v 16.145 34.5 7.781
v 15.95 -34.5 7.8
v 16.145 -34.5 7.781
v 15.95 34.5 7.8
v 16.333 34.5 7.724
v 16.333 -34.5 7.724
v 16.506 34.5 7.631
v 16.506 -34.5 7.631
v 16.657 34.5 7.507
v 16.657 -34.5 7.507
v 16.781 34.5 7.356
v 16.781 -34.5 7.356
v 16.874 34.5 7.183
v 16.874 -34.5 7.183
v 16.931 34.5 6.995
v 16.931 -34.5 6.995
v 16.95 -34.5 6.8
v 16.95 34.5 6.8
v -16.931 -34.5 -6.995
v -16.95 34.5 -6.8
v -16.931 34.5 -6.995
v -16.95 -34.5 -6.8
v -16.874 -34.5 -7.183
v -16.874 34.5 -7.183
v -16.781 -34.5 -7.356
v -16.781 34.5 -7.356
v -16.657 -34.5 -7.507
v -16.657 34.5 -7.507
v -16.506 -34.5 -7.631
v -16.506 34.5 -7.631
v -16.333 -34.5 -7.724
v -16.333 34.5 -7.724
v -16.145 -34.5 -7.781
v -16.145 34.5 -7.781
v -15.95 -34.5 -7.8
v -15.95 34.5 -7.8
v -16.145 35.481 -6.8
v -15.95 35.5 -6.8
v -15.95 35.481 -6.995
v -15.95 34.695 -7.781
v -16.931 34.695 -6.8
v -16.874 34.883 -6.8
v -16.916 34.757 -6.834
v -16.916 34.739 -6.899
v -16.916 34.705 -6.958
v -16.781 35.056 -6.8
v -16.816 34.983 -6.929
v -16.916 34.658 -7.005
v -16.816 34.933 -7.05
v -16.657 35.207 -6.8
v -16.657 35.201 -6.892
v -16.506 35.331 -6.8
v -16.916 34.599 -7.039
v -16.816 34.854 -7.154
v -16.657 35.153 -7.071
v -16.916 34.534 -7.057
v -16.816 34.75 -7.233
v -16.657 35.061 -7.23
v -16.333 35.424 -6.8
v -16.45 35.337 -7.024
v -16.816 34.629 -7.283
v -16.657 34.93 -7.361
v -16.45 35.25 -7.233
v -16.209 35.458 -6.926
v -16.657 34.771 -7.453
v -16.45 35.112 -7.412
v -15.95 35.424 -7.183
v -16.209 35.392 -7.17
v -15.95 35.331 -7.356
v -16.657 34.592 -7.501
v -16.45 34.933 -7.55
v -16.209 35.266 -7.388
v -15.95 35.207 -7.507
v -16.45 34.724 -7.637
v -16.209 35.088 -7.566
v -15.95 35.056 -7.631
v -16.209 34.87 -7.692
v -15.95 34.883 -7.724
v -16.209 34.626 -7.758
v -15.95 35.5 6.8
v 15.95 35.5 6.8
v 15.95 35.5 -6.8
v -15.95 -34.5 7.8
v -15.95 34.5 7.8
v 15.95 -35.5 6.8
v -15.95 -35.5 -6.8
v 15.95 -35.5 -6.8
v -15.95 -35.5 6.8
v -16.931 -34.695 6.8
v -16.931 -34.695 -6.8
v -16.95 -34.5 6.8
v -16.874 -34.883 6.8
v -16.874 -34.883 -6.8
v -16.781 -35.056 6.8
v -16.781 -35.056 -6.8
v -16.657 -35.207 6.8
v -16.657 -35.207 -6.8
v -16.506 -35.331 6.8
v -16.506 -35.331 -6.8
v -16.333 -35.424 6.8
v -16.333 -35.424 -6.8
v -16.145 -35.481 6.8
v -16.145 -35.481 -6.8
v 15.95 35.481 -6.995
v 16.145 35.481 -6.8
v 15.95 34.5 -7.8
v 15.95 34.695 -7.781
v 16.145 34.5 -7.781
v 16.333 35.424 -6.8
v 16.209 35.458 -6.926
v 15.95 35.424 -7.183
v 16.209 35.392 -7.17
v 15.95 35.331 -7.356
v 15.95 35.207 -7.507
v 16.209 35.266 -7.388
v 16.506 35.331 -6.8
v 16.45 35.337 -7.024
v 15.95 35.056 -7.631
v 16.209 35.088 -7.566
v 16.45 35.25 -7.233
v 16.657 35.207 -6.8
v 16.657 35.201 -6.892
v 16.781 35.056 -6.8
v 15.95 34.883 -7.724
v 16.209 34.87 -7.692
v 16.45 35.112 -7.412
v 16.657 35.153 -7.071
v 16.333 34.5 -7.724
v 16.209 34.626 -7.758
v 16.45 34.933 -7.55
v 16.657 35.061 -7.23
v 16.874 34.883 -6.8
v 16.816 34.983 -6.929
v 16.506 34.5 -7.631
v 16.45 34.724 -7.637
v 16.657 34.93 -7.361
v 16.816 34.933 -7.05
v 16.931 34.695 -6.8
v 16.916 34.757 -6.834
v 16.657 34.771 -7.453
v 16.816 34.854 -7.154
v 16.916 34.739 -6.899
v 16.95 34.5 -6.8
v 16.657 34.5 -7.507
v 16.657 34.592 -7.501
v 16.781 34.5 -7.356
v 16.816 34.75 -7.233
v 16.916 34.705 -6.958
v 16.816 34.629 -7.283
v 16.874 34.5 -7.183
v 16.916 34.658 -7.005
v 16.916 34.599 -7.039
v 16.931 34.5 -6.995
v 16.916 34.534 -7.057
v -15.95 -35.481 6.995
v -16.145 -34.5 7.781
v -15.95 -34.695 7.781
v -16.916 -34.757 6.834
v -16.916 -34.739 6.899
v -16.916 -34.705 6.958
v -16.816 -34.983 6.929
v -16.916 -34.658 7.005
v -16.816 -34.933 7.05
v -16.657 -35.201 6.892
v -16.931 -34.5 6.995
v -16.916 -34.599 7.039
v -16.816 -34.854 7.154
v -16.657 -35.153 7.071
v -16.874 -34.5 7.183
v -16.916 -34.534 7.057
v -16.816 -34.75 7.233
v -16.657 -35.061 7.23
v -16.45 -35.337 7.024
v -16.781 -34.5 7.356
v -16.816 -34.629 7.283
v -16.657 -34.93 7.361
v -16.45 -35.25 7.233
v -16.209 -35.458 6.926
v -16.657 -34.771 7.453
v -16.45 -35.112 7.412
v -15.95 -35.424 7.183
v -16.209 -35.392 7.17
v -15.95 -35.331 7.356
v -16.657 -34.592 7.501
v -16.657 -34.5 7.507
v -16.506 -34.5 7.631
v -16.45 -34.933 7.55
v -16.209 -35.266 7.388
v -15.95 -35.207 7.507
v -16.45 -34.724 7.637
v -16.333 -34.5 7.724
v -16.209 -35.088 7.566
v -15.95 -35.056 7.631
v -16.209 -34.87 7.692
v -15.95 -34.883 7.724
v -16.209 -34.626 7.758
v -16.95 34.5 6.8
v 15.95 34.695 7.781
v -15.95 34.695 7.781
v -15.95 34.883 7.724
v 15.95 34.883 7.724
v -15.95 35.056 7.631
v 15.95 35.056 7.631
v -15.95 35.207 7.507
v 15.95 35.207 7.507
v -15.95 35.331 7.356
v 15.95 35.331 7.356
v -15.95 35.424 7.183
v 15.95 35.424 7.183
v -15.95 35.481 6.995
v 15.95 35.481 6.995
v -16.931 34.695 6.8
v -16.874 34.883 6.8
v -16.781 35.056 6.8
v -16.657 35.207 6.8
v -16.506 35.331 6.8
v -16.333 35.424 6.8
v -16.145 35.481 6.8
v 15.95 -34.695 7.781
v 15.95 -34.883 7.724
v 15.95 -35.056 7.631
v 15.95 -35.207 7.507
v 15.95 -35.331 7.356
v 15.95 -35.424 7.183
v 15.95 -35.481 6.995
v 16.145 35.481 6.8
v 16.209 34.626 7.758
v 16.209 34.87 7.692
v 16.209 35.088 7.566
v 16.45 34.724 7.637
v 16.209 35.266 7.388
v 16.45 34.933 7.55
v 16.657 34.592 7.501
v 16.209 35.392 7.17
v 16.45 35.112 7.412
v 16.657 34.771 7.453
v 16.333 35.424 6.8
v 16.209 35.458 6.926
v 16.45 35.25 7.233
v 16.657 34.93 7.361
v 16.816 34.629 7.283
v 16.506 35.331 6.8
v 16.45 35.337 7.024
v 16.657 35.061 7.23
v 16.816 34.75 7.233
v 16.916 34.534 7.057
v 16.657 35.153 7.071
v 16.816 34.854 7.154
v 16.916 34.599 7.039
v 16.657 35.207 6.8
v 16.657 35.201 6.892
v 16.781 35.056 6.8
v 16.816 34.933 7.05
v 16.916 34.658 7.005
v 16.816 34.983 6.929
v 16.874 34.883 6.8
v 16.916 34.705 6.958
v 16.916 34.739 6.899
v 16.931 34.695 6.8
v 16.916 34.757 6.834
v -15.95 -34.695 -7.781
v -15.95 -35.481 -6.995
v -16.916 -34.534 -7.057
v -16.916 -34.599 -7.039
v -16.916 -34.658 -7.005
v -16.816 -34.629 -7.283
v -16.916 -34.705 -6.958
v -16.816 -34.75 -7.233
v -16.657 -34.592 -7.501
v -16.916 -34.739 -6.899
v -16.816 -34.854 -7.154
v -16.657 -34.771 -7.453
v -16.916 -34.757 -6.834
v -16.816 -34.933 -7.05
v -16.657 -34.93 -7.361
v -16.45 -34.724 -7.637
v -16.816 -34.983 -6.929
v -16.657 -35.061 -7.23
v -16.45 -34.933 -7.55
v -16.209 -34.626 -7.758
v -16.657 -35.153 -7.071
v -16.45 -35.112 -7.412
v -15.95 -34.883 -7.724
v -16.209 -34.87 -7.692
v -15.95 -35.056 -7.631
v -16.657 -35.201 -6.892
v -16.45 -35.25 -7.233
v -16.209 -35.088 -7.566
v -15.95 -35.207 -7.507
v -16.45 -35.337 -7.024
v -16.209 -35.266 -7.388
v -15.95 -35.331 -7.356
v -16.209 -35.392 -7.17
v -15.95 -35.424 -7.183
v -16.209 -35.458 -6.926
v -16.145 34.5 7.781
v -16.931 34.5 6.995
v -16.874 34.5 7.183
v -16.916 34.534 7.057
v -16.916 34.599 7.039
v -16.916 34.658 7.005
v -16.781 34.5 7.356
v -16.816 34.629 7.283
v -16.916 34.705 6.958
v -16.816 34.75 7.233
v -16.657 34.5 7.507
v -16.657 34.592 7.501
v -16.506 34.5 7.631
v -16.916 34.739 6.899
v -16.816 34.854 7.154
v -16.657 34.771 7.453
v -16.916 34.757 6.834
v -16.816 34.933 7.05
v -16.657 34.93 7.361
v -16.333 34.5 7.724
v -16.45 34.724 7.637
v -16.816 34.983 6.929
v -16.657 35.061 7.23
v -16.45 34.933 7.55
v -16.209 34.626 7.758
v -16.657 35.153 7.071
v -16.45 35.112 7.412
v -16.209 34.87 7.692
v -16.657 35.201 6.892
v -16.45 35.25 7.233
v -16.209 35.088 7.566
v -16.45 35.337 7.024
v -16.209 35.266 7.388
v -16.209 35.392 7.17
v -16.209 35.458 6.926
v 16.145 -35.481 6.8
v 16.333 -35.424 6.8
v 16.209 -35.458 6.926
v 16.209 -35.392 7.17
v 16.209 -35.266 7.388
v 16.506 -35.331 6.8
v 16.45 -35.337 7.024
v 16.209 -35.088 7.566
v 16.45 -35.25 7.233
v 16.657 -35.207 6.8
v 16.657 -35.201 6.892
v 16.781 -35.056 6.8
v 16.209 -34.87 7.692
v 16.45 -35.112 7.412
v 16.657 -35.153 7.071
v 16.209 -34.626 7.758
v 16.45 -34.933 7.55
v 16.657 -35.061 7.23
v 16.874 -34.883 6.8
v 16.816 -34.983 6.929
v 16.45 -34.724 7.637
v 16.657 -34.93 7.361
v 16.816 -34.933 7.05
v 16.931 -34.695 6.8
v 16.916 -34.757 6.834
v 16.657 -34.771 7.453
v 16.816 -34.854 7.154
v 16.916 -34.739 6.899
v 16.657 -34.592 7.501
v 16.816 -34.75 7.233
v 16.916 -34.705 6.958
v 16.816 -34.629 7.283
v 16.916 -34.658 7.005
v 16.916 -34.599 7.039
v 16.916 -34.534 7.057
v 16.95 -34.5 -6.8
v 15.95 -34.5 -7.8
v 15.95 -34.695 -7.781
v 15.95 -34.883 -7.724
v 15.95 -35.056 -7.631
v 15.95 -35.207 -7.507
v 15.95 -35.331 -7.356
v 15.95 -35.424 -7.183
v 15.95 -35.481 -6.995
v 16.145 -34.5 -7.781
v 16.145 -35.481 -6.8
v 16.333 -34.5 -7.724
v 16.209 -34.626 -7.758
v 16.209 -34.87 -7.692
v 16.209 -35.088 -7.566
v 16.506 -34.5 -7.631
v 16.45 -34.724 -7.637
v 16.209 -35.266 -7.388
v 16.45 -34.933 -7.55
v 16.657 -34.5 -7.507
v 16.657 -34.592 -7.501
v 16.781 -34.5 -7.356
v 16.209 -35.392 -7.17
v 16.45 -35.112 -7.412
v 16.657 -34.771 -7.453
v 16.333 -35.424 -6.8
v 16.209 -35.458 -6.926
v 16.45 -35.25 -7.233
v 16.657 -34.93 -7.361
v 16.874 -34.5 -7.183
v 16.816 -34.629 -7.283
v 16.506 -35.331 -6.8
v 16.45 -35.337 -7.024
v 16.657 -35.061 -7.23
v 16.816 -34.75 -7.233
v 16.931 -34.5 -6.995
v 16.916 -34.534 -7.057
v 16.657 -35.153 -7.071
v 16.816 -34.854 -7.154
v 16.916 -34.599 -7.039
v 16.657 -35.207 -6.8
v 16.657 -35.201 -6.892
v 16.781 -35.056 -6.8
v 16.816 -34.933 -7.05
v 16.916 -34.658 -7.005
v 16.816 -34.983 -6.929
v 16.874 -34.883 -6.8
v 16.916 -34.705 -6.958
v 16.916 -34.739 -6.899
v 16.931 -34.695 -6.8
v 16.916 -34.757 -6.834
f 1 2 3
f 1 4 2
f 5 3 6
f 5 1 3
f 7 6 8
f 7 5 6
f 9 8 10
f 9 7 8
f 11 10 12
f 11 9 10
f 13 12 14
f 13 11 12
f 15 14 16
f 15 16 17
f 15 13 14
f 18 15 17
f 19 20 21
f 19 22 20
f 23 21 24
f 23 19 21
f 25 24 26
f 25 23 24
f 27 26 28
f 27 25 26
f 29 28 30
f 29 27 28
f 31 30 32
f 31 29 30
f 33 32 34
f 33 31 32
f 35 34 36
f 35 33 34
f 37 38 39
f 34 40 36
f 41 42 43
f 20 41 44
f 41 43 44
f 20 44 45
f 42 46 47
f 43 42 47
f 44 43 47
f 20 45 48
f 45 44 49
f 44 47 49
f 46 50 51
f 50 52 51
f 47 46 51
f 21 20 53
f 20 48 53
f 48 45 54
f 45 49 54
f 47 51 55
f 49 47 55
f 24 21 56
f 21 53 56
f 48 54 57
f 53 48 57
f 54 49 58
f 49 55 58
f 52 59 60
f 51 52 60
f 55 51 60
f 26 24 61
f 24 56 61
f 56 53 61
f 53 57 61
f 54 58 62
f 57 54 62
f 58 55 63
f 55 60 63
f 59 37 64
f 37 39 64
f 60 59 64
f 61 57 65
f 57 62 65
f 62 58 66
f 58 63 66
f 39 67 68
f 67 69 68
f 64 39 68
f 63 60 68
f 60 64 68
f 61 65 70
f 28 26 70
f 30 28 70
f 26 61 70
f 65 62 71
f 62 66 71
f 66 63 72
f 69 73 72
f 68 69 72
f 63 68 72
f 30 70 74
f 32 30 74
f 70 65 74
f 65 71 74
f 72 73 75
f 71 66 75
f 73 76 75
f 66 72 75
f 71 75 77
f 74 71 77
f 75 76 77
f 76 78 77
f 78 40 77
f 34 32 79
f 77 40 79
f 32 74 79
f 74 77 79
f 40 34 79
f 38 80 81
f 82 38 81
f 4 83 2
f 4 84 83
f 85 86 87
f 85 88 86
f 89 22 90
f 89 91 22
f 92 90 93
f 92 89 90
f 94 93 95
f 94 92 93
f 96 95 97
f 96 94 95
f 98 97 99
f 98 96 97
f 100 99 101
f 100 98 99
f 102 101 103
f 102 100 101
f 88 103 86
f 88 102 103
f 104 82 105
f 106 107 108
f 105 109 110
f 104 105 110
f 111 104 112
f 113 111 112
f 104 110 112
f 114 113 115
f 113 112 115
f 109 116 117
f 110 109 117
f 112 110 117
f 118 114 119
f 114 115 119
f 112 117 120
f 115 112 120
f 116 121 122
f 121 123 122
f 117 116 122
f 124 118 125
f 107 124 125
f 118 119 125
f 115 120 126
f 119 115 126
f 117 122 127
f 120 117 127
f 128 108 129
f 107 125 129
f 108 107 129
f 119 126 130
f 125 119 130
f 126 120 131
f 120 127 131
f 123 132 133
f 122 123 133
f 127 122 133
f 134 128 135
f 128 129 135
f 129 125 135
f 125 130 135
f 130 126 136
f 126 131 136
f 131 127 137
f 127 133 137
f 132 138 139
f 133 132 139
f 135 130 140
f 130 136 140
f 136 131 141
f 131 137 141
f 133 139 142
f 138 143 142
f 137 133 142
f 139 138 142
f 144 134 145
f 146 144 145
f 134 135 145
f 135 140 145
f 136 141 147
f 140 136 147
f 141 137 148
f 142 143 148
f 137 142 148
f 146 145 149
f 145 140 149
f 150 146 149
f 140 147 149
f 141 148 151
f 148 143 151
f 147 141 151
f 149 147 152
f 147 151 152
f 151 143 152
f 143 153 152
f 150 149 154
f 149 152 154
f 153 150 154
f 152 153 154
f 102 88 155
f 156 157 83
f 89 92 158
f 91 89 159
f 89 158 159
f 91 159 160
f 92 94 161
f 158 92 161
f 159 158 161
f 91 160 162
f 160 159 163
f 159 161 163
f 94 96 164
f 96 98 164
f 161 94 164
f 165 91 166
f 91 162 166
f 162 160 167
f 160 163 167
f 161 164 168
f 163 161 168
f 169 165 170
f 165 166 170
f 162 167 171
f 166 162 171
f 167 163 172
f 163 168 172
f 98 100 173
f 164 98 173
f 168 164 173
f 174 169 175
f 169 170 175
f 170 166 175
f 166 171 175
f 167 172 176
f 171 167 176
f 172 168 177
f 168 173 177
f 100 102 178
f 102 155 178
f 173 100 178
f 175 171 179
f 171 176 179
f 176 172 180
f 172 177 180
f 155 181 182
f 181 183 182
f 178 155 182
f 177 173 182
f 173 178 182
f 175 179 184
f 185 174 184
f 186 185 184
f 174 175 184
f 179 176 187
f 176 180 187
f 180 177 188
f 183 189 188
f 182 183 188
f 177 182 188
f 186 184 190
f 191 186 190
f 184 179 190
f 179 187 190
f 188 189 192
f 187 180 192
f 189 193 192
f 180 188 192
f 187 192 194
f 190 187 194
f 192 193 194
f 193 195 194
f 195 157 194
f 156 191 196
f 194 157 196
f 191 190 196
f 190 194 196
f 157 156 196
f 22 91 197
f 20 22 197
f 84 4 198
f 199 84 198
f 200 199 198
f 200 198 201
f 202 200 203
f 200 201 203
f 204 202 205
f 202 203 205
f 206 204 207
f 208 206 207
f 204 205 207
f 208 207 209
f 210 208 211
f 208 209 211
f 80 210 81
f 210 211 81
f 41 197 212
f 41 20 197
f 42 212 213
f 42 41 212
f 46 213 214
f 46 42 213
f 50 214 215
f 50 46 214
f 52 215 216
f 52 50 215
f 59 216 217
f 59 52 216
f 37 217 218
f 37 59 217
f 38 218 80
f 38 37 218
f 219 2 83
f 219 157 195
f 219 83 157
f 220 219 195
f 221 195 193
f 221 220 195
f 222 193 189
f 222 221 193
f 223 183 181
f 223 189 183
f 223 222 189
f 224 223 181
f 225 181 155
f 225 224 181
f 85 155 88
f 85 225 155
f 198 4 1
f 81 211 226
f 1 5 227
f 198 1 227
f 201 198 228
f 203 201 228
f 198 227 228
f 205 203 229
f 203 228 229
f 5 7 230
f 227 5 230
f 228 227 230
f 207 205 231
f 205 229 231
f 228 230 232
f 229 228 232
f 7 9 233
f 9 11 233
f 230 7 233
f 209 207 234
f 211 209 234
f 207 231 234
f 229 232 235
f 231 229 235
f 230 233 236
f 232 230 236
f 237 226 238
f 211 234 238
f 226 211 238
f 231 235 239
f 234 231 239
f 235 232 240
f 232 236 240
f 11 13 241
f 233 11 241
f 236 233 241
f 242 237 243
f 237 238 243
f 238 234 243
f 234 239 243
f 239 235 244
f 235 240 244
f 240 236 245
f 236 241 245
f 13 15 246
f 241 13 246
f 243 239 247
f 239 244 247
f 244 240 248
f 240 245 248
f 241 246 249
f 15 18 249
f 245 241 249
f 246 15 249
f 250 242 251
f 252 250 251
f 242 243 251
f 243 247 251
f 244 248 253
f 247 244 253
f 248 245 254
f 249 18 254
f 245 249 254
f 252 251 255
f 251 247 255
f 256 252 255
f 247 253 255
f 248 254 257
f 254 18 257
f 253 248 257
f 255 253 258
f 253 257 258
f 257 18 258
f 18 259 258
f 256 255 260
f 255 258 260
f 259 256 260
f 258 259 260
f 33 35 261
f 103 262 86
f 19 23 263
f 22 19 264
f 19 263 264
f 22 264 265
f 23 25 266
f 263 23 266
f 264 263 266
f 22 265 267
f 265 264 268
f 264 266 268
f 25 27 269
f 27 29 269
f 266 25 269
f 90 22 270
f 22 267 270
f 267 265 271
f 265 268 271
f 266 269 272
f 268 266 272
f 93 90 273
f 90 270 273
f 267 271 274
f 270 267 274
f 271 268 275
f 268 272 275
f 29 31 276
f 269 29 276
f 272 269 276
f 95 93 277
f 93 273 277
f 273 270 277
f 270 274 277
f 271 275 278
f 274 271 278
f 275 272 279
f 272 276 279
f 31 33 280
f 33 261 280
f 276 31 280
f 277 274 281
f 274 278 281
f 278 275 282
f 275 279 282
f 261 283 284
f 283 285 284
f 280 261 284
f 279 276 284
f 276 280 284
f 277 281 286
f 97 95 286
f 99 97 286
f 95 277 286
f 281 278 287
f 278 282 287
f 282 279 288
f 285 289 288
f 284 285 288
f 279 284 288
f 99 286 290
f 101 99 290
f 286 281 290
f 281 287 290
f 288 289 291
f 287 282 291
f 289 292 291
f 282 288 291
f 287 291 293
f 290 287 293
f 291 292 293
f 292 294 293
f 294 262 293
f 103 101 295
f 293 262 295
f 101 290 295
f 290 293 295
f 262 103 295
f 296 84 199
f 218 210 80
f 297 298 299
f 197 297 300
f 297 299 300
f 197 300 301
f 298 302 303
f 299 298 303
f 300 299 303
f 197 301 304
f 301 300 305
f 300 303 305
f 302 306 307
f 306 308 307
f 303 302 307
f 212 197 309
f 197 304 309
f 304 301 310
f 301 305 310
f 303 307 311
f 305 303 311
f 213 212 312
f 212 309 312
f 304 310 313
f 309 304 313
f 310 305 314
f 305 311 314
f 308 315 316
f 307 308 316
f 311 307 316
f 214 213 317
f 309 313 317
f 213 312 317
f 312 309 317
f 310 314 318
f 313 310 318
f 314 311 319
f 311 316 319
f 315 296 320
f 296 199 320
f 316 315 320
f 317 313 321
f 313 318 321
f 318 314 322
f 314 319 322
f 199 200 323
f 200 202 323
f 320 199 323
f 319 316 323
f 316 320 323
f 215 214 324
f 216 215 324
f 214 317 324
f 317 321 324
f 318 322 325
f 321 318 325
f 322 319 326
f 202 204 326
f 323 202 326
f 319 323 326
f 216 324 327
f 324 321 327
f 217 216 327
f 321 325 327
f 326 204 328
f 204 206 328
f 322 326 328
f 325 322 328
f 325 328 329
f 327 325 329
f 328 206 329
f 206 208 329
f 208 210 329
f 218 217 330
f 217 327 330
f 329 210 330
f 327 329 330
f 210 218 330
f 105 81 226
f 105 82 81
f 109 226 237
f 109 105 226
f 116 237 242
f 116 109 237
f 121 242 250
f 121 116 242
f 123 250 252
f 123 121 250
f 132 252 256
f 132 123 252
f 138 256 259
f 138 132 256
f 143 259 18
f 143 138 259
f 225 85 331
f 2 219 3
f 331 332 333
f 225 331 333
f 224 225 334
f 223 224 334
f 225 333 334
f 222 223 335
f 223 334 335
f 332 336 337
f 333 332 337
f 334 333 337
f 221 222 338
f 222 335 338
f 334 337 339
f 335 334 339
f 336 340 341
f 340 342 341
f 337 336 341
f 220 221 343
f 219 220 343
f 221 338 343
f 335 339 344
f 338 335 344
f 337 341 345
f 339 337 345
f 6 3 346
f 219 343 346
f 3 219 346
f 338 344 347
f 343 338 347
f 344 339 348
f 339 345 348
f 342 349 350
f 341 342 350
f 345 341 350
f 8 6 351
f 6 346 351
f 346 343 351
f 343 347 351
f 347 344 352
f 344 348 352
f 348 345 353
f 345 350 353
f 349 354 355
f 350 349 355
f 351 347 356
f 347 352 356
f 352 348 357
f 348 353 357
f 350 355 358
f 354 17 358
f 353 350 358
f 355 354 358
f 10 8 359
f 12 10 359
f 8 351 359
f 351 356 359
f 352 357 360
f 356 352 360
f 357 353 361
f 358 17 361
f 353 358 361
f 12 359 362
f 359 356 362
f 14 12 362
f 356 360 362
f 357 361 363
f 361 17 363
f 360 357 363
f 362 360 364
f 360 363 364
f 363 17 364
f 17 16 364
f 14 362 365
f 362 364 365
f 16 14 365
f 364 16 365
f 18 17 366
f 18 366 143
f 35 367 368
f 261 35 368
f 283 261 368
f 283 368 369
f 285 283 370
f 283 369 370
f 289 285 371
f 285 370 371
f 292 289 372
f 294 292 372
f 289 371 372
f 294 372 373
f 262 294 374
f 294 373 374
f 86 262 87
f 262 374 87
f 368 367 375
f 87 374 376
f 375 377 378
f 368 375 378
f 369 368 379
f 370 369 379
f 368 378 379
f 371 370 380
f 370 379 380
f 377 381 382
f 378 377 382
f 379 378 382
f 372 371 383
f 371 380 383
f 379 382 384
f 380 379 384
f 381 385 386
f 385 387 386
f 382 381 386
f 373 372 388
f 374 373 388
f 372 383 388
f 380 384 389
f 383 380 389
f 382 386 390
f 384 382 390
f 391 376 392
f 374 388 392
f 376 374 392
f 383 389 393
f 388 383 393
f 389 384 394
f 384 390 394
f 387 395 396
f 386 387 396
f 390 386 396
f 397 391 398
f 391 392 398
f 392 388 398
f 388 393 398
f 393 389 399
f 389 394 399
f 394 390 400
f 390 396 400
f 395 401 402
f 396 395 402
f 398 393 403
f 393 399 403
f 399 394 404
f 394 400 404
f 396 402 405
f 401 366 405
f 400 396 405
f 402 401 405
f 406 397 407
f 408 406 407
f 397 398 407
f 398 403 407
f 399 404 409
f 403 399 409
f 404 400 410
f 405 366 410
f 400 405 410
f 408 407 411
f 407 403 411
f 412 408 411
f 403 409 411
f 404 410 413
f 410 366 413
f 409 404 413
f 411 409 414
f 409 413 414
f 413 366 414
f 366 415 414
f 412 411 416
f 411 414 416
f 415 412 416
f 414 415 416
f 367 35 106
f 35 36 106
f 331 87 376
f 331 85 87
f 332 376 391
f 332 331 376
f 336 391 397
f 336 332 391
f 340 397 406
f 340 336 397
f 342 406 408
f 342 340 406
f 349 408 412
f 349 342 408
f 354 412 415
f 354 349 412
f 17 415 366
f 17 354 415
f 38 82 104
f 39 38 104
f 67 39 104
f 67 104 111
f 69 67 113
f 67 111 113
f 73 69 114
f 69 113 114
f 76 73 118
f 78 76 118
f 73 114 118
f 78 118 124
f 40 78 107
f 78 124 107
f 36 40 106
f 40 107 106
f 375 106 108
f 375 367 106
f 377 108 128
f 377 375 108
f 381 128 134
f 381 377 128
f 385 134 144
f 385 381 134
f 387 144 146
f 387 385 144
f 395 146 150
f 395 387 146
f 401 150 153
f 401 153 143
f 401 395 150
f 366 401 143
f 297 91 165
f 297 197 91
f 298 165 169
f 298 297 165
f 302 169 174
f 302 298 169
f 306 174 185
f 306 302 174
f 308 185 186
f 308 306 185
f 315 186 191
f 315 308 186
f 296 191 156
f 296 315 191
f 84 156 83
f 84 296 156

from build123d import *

# Parameters (mm, degrees)
SKETCH1_W           = 33.9
SKETCH1_H           = 71
BOSS_EXTRUDE1_DEPTH = 7.8
FILLET1_R           = 1
FILLET2_R           = 1


with BuildPart() as part:
    # Sketch1 → Boss-Extrude1 (new body, symmetric)
    with BuildSketch(Plane.XY):
        Rectangle(SKETCH1_W, SKETCH1_H)
    extrude(amount=BOSS_EXTRUDE1_DEPTH, both=True)

    # Fillet1
    fillet1_edges = [part.edges().sort_by_distance(p)[0] for p in [
        (0, -35.5, 7.8),
        (0, -35.5, -7.8),
        (0, 35.5, -7.8),
        (0, 35.5, 7.8),
    ]]
    fillet(fillet1_edges, radius=FILLET1_R)

    # Fillet2
    fillet2_edges = [part.edges().sort_by_distance(p)[0] for p in [
        (16.95, -35.5, 0),
        (-16.95, -35.5, 0),
        (16.95, 0, -7.8),
        (16.95, 35.5, 0),
        (16.95, 0, 7.8),
        (16.95, 35.207106781, 7.507106781),
        (16.95, 35.207106781, -7.507106781),
        (16.95, -35.207106781, 7.507106781),
        (16.95, -35.207106781, -7.507106781),
        (-16.95, 0, -7.8),
        (-16.95, 0, 7.8),
        (-16.95, 35.5, 0),
        (-16.95, 35.207106781, 7.507106781),
        (-16.95, 35.207106781, -7.507106781),
        (-16.95, -35.207106781, 7.507106781),
        (-16.95, -35.207106781, -7.507106781),
    ]]
    fillet(fillet2_edges, radius=FILLET2_R)


solid = part.part
